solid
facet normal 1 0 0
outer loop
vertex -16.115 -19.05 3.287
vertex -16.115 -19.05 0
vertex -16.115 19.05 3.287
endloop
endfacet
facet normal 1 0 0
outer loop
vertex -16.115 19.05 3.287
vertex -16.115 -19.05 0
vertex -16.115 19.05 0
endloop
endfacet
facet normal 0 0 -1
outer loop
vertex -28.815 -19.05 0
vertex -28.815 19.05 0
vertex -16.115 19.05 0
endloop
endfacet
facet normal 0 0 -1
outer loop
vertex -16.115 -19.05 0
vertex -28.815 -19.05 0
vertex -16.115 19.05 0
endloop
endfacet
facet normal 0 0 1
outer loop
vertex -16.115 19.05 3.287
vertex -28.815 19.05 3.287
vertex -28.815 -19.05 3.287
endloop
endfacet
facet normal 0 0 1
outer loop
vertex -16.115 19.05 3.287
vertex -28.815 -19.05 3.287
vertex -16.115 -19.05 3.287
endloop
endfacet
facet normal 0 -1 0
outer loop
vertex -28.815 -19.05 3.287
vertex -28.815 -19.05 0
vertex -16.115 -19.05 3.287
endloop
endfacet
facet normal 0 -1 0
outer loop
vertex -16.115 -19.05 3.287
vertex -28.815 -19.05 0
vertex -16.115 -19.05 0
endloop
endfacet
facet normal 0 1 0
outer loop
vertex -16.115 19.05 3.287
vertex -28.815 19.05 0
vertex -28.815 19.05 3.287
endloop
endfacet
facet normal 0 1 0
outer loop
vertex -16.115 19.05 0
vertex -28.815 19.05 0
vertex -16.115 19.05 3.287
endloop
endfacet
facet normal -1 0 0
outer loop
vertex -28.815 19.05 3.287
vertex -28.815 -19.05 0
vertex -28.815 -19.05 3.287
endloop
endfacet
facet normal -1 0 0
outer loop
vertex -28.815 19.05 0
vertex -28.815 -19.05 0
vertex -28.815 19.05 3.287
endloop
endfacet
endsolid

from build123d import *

# Parameters (mm, degrees)
SKETCH1_W             = 12.7
SKETCH1_H             = 38.1
BOSS_EXTRUDE1_DEPTH   = 3.28676
BOSS_EXTRUDE1_2_DEPTH = 3.28676


with BuildPart() as part:
    # Sketch1 → Boss-Extrude1 (new body)
    with BuildSketch(Plane.XY):
        with Locations((22.465, 0)):
            Rectangle(SKETCH1_W, SKETCH1_H)
    extrude(amount=BOSS_EXTRUDE1_DEPTH)


with BuildPart() as body_2:
    # Sketch1 → Boss-Extrude1 2 (new body)
    with BuildSketch(Plane.XY):
        with Locations((-22.465, 0)):
            Rectangle(SKETCH1_W, SKETCH1_H)
    extrude(amount=BOSS_EXTRUDE1_2_DEPTH)


solid = body_2.part
